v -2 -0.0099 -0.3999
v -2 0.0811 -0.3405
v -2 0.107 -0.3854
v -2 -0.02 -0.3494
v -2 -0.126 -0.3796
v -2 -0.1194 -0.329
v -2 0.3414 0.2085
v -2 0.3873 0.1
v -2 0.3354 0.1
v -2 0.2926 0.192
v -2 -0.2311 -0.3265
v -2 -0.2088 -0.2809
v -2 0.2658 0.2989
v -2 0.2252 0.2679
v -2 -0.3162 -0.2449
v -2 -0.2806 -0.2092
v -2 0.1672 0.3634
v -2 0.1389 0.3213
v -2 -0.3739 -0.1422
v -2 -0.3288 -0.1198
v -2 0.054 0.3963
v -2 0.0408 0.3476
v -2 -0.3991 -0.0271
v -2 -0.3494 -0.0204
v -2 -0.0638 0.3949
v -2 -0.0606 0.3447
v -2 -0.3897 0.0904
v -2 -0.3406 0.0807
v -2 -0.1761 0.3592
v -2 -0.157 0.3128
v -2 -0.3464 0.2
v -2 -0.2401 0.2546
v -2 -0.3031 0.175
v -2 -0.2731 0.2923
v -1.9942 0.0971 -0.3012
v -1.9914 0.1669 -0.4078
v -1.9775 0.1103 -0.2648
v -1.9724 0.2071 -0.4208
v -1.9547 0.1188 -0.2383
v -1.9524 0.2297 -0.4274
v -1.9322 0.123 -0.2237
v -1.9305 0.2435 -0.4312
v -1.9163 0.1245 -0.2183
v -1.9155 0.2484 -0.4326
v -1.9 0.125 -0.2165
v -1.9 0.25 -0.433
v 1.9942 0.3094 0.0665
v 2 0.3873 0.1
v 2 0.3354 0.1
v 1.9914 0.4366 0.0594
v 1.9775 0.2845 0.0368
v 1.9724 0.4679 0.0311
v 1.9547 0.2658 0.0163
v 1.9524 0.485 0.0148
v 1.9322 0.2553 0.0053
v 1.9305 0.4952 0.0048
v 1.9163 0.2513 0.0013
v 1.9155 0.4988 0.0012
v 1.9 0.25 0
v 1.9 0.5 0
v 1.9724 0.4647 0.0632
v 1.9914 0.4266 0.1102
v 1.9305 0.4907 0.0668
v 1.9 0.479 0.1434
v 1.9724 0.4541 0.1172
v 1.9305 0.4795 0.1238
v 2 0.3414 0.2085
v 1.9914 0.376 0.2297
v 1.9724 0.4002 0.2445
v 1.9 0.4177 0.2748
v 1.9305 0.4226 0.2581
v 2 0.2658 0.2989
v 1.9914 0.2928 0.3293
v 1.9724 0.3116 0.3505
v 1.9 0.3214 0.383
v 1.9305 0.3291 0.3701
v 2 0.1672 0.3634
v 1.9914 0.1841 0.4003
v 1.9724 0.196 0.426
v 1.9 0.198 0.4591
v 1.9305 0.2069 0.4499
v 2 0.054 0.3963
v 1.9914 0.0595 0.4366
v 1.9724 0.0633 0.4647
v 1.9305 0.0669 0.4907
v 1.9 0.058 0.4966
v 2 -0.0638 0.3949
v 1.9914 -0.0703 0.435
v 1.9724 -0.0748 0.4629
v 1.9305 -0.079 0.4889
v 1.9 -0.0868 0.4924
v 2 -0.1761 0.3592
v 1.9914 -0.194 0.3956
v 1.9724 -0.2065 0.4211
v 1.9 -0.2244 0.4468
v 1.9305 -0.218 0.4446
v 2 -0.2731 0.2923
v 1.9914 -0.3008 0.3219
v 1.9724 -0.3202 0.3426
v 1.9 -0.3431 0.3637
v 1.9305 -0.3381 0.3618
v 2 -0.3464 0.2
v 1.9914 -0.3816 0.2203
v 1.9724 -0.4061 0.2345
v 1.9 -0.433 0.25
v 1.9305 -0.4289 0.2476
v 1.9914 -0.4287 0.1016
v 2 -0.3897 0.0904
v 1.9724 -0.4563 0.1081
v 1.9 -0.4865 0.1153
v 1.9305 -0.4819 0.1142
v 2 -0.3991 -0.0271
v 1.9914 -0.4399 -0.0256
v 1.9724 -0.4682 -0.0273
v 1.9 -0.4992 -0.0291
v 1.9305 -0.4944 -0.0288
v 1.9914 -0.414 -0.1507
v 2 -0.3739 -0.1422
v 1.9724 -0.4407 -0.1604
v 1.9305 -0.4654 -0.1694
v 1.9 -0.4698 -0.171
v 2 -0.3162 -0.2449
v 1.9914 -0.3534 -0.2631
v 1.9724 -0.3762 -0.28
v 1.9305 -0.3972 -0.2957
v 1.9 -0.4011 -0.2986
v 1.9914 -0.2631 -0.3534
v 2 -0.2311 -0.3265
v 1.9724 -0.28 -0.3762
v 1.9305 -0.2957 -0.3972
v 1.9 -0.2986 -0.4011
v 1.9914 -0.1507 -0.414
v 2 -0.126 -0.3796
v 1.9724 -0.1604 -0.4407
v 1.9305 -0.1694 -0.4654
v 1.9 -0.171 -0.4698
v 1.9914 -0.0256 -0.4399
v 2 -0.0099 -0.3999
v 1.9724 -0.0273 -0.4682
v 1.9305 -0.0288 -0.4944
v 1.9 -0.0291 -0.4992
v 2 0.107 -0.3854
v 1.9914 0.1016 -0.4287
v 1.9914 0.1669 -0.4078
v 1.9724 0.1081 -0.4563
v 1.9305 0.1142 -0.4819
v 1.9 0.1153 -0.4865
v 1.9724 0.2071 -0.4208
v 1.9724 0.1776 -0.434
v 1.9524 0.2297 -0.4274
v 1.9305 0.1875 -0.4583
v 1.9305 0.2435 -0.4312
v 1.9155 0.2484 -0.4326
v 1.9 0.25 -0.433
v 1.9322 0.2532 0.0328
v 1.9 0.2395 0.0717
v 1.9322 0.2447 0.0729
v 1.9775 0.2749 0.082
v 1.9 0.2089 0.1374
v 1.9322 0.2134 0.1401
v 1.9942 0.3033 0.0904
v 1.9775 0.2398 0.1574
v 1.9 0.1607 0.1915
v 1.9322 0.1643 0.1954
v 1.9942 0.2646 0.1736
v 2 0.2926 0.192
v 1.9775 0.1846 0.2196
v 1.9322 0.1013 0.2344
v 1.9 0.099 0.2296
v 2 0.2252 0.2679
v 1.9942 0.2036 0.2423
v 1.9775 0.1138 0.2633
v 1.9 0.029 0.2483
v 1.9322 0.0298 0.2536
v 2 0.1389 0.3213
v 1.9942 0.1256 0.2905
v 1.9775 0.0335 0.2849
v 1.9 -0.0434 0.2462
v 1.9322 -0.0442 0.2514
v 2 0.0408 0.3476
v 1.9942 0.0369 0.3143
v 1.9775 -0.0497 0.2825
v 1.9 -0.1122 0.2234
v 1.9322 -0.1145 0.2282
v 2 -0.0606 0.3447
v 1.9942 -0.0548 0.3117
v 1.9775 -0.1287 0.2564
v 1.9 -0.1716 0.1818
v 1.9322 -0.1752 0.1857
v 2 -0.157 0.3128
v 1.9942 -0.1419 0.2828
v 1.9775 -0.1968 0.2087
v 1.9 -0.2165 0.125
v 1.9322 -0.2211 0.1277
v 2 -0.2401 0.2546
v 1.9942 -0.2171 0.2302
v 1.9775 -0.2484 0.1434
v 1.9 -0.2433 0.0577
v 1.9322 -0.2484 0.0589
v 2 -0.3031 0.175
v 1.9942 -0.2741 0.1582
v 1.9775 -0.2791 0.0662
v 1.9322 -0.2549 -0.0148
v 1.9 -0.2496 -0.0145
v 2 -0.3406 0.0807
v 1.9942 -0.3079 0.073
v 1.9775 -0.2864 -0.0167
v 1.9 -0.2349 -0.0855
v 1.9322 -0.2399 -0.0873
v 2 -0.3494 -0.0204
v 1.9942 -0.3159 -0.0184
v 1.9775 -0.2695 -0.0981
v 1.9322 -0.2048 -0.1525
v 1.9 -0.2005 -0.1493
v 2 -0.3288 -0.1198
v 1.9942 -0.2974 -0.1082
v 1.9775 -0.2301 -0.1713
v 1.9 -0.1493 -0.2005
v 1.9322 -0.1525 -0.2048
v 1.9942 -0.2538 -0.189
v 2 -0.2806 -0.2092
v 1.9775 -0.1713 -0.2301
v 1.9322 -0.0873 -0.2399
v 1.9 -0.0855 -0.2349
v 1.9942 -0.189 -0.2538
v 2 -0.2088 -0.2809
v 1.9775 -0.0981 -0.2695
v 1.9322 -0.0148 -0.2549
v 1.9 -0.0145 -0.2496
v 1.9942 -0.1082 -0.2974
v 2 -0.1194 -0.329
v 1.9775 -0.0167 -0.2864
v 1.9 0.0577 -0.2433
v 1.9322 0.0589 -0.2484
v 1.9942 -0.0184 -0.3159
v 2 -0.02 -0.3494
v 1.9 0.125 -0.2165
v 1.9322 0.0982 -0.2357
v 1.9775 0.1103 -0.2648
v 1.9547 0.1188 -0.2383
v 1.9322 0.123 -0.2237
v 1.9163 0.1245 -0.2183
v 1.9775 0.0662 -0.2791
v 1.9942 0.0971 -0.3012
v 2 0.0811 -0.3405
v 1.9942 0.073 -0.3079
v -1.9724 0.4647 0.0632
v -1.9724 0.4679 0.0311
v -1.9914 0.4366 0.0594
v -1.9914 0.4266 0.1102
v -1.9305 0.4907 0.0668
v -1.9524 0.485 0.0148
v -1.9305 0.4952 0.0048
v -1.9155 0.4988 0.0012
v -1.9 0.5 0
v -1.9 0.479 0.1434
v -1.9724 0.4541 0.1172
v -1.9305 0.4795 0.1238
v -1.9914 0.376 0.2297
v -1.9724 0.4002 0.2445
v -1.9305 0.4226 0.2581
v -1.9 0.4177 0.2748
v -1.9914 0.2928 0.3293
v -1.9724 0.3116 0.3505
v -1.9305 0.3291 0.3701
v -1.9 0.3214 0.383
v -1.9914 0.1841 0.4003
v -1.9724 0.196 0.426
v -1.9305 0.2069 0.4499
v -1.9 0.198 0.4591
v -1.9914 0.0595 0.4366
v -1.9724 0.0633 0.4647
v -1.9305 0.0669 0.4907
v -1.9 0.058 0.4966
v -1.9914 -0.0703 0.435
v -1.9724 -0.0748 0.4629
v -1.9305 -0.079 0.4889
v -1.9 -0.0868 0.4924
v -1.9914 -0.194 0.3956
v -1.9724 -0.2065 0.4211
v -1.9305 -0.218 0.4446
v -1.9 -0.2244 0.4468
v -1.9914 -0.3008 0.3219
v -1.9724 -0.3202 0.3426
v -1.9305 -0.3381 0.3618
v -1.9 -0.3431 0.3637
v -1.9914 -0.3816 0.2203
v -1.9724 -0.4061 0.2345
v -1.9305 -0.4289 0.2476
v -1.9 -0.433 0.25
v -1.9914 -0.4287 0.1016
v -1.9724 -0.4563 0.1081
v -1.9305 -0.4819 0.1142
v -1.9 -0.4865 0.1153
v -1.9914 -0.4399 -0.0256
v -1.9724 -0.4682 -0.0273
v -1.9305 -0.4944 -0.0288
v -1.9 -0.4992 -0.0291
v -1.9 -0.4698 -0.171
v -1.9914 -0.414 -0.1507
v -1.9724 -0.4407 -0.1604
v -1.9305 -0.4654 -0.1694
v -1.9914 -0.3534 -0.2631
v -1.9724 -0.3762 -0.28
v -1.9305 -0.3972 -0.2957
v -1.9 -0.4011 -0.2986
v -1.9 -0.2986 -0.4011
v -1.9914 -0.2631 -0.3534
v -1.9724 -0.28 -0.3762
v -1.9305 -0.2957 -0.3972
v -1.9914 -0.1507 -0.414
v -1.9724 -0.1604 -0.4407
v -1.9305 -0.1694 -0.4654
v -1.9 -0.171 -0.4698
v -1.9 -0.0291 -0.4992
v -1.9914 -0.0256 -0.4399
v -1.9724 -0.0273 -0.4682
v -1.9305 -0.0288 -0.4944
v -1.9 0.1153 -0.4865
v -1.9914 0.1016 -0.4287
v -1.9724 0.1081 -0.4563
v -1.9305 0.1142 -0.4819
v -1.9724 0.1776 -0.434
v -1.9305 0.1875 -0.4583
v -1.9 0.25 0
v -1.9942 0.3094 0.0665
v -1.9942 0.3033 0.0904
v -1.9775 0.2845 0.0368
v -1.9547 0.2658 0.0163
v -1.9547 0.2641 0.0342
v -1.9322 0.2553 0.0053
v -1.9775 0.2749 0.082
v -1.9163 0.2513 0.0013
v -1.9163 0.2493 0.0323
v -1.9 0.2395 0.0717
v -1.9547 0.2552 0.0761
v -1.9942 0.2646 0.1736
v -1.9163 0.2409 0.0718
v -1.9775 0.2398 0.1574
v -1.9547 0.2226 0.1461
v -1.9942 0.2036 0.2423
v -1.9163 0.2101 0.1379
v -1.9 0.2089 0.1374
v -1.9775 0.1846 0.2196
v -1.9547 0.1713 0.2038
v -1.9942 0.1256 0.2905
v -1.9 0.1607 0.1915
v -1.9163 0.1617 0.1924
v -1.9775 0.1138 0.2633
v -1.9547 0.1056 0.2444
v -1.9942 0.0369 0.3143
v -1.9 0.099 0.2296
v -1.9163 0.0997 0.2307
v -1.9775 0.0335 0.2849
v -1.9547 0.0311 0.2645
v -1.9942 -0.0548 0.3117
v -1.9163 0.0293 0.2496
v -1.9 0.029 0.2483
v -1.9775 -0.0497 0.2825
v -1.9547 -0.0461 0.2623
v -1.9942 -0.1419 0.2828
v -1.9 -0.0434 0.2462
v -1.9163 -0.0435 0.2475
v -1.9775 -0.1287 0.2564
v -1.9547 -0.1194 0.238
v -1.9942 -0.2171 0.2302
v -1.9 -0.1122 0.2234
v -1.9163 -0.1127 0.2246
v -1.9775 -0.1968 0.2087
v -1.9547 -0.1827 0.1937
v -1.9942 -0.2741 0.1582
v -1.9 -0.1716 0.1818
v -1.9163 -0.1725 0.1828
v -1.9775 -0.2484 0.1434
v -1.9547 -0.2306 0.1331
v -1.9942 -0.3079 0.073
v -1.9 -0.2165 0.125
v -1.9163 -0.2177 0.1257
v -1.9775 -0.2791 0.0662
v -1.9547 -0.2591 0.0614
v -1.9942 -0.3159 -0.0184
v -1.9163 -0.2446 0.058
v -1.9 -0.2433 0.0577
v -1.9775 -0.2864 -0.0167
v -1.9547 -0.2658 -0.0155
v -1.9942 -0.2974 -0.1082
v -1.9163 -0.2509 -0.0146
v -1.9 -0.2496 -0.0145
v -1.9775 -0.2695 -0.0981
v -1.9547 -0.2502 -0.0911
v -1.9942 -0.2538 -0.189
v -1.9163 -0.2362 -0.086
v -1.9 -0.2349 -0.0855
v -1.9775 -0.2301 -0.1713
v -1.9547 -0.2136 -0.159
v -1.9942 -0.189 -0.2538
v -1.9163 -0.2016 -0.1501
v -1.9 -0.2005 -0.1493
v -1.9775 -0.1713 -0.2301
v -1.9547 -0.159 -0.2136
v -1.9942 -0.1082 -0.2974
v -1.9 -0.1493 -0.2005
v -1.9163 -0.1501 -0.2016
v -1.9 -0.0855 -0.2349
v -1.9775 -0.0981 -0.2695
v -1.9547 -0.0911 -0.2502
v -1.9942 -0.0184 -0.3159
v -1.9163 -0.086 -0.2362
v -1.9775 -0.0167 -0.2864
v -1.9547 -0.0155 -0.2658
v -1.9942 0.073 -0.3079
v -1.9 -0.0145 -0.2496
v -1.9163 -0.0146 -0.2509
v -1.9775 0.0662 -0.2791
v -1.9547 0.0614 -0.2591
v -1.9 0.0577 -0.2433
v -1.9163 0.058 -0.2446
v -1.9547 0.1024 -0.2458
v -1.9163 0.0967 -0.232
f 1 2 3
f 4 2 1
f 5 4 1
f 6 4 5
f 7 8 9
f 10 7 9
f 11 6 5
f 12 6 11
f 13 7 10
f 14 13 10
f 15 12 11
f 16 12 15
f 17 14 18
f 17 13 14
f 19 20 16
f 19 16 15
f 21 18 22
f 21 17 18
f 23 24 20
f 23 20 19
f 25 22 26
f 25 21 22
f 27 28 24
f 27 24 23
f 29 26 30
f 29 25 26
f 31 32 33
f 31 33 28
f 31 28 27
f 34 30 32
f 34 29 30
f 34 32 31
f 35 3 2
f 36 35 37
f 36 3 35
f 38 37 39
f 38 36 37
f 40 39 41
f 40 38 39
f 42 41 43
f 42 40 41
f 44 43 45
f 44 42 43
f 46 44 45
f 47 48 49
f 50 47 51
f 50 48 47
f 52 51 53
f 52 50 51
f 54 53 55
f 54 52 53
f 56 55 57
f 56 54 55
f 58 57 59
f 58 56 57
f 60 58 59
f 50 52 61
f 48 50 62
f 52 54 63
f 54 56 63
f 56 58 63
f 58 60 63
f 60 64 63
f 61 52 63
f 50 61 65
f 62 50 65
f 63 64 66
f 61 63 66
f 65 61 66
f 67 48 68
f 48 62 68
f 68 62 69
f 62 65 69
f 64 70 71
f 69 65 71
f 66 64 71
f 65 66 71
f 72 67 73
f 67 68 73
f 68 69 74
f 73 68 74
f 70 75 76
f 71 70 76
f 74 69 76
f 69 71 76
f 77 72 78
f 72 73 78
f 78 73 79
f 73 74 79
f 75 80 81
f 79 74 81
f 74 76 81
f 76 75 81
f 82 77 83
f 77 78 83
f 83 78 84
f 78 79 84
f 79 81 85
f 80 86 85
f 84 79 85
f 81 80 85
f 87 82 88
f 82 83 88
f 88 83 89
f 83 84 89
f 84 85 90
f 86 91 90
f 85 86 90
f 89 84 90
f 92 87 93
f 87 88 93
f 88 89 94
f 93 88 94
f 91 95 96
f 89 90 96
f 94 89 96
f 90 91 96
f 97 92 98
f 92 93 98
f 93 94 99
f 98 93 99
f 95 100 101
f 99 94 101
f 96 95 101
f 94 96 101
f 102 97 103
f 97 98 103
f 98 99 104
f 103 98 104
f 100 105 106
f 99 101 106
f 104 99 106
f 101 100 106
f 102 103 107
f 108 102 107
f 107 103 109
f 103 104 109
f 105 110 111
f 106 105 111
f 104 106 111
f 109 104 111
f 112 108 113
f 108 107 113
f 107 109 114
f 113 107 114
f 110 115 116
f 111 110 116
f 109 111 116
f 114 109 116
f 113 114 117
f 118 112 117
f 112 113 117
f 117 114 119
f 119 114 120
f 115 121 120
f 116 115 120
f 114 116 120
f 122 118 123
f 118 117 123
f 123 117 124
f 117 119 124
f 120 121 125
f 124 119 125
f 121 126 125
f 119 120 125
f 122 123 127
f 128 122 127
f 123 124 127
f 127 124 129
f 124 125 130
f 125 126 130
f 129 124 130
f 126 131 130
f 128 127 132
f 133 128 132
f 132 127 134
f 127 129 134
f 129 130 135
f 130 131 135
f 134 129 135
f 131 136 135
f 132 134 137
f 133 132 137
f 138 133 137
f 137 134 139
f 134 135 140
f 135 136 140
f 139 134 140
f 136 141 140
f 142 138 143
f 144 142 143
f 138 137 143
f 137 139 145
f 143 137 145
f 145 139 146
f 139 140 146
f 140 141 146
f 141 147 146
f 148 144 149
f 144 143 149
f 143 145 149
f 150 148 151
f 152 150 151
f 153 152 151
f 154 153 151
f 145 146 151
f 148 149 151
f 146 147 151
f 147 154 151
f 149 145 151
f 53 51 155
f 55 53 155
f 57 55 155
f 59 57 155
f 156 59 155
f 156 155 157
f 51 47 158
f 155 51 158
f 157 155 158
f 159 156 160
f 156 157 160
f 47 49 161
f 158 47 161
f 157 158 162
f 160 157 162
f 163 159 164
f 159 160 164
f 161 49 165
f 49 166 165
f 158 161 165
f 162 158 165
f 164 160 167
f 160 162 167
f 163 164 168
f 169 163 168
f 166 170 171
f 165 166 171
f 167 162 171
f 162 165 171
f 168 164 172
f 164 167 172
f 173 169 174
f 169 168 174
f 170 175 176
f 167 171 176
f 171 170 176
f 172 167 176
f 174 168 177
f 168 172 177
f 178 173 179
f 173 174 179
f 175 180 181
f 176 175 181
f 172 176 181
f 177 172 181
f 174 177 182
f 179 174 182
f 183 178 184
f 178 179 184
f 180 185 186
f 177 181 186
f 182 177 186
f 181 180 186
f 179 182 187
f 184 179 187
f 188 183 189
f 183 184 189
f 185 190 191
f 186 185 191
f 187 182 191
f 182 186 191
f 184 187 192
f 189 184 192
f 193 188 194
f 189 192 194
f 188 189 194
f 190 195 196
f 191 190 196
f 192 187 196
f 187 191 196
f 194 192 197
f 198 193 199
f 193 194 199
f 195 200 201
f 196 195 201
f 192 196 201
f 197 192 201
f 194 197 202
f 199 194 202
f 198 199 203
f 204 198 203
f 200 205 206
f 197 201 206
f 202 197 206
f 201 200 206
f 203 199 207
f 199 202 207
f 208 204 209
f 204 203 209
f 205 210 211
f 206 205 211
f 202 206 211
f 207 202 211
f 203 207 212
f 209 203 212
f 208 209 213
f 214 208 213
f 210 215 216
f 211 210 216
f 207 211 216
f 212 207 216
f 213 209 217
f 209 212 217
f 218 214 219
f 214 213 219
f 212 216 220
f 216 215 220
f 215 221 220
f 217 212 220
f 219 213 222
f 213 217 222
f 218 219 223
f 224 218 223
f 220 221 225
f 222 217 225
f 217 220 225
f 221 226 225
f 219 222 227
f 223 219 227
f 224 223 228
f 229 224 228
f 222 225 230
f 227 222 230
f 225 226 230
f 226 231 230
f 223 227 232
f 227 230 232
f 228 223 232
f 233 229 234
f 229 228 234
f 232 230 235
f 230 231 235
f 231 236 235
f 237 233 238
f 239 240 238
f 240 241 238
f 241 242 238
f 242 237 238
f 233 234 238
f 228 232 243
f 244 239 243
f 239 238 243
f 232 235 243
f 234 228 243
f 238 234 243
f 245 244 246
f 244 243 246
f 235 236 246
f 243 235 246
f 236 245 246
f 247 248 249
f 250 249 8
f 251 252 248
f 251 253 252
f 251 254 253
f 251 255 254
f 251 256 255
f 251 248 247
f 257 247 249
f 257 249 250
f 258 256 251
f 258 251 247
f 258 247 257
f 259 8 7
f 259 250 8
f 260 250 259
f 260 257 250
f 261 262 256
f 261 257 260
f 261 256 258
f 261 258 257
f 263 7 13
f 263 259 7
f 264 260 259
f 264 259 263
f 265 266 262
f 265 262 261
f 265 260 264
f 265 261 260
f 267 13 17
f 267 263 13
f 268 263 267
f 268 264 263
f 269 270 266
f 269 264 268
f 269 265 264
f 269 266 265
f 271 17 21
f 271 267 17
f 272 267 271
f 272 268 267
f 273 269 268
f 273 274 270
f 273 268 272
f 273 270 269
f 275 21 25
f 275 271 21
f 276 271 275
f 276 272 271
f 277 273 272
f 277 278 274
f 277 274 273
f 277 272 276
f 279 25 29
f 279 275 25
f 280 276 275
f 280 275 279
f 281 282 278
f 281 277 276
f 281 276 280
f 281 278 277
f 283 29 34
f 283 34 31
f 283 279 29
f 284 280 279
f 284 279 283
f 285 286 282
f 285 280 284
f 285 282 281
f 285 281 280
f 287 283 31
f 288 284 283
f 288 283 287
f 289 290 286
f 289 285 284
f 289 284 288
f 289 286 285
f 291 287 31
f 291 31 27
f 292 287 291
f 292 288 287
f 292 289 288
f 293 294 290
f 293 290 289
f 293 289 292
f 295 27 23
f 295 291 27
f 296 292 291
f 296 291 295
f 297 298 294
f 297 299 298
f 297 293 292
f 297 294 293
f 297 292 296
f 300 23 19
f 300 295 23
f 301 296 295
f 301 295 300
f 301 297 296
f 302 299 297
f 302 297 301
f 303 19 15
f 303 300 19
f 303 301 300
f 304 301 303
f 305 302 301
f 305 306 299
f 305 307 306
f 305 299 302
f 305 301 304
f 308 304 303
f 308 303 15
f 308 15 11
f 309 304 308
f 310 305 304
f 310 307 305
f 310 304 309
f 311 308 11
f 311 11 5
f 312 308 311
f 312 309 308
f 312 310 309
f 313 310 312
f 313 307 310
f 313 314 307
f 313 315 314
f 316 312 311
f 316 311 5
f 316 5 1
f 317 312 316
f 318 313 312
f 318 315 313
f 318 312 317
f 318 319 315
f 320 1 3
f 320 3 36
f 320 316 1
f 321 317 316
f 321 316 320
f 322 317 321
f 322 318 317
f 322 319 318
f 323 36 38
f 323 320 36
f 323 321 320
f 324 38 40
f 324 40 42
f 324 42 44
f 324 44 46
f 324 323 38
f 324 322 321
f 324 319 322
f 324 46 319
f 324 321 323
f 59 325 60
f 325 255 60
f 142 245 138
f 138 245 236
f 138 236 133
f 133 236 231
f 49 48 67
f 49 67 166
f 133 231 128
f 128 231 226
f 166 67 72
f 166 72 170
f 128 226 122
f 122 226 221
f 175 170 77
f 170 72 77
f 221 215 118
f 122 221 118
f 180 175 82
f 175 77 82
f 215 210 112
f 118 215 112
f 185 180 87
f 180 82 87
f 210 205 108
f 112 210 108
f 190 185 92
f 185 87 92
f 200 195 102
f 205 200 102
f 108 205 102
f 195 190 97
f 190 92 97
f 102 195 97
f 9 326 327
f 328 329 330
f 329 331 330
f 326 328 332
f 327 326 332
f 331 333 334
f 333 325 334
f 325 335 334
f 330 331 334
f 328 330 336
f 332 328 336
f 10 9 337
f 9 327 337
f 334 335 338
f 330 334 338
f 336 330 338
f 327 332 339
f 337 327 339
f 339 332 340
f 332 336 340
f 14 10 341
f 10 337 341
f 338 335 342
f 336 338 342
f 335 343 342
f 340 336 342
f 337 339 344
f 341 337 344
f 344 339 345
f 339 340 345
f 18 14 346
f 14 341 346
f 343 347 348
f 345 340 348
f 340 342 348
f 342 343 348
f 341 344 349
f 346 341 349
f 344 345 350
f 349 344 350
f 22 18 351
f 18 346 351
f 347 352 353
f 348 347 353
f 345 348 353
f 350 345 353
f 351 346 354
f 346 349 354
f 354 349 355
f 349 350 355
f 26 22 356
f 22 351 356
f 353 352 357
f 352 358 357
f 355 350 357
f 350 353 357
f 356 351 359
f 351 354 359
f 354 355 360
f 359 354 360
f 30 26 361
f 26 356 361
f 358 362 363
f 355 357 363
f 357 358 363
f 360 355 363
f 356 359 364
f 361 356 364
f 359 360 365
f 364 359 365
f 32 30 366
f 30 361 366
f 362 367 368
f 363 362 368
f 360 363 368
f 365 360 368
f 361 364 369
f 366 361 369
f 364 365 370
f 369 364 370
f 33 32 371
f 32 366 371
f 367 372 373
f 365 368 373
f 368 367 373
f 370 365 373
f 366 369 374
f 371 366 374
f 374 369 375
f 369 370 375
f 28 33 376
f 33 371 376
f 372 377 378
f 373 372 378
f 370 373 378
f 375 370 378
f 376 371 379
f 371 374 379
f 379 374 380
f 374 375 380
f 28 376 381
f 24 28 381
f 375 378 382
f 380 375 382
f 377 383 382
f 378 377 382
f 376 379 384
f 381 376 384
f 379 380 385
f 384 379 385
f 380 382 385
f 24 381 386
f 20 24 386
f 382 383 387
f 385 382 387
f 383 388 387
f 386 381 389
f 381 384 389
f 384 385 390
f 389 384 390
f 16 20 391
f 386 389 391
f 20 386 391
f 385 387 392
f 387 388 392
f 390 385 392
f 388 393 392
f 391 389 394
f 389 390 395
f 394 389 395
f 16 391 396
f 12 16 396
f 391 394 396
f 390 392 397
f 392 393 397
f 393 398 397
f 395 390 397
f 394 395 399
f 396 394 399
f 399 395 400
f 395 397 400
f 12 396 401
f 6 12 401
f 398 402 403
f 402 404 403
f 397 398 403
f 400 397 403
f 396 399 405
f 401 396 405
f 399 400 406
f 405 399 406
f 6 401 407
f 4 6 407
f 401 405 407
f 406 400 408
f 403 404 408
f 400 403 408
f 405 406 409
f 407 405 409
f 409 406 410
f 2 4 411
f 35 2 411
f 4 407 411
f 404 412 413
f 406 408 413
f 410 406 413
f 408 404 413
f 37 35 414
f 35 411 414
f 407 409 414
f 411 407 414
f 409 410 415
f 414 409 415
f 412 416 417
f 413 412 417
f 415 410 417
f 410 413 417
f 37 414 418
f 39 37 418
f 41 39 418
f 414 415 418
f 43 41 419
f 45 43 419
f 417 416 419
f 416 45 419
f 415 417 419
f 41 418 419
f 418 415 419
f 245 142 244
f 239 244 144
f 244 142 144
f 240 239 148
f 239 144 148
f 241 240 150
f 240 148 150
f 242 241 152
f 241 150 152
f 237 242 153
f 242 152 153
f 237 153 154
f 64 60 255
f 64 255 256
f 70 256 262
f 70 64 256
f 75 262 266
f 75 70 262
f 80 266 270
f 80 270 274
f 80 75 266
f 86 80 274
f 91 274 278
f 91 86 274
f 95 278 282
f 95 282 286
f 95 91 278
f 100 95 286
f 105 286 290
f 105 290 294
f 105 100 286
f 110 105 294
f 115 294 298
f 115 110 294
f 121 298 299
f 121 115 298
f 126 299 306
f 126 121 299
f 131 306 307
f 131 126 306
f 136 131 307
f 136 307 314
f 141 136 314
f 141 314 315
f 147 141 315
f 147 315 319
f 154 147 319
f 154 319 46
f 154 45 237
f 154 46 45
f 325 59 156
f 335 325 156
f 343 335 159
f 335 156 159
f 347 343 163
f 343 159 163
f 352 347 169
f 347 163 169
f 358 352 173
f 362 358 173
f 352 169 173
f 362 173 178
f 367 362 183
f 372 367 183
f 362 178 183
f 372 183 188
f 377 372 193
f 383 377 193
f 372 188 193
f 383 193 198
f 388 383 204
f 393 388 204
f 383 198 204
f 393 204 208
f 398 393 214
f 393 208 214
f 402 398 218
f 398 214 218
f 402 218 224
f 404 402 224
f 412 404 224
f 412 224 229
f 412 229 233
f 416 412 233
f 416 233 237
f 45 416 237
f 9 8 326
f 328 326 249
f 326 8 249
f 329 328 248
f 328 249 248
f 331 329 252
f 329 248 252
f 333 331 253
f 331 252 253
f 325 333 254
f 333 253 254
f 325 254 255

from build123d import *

# Parameters (mm, degrees)
SKETCH1_W      = 4
SKETCH1_H      = 0.25
REVOLVE1_ANGLE = 300
FILLET1_R      = 0.1


with BuildPart() as part:
    # Sketch1 → Revolve1 (revolve)
    with BuildSketch(Plane.XY):
        with Locations((0, 0.375)):
            Rectangle(SKETCH1_W, SKETCH1_H)
    revolve(axis=Axis((0, 0, 0), (1, 0, 0)), revolution_arc=REVOLVE1_ANGLE)

    # Fillet1
    fillet1_edges = [part.edges().sort_by_distance(p)[0] for p in [
        (2, 0.1875, -0.324759526),
        (-2, 0.375, 0),
        (-2, 0.1875, -0.324759526),
        (2, 0.375, 0),
        (-2, -0.433012702, 0.25),
        (2, -0.433012702, 0.25),
        (2, -0.216506351, 0.125),
        (-2, -0.216506351, 0.125),
    ]]
    fillet(fillet1_edges, radius=FILLET1_R)


solid = part.part
